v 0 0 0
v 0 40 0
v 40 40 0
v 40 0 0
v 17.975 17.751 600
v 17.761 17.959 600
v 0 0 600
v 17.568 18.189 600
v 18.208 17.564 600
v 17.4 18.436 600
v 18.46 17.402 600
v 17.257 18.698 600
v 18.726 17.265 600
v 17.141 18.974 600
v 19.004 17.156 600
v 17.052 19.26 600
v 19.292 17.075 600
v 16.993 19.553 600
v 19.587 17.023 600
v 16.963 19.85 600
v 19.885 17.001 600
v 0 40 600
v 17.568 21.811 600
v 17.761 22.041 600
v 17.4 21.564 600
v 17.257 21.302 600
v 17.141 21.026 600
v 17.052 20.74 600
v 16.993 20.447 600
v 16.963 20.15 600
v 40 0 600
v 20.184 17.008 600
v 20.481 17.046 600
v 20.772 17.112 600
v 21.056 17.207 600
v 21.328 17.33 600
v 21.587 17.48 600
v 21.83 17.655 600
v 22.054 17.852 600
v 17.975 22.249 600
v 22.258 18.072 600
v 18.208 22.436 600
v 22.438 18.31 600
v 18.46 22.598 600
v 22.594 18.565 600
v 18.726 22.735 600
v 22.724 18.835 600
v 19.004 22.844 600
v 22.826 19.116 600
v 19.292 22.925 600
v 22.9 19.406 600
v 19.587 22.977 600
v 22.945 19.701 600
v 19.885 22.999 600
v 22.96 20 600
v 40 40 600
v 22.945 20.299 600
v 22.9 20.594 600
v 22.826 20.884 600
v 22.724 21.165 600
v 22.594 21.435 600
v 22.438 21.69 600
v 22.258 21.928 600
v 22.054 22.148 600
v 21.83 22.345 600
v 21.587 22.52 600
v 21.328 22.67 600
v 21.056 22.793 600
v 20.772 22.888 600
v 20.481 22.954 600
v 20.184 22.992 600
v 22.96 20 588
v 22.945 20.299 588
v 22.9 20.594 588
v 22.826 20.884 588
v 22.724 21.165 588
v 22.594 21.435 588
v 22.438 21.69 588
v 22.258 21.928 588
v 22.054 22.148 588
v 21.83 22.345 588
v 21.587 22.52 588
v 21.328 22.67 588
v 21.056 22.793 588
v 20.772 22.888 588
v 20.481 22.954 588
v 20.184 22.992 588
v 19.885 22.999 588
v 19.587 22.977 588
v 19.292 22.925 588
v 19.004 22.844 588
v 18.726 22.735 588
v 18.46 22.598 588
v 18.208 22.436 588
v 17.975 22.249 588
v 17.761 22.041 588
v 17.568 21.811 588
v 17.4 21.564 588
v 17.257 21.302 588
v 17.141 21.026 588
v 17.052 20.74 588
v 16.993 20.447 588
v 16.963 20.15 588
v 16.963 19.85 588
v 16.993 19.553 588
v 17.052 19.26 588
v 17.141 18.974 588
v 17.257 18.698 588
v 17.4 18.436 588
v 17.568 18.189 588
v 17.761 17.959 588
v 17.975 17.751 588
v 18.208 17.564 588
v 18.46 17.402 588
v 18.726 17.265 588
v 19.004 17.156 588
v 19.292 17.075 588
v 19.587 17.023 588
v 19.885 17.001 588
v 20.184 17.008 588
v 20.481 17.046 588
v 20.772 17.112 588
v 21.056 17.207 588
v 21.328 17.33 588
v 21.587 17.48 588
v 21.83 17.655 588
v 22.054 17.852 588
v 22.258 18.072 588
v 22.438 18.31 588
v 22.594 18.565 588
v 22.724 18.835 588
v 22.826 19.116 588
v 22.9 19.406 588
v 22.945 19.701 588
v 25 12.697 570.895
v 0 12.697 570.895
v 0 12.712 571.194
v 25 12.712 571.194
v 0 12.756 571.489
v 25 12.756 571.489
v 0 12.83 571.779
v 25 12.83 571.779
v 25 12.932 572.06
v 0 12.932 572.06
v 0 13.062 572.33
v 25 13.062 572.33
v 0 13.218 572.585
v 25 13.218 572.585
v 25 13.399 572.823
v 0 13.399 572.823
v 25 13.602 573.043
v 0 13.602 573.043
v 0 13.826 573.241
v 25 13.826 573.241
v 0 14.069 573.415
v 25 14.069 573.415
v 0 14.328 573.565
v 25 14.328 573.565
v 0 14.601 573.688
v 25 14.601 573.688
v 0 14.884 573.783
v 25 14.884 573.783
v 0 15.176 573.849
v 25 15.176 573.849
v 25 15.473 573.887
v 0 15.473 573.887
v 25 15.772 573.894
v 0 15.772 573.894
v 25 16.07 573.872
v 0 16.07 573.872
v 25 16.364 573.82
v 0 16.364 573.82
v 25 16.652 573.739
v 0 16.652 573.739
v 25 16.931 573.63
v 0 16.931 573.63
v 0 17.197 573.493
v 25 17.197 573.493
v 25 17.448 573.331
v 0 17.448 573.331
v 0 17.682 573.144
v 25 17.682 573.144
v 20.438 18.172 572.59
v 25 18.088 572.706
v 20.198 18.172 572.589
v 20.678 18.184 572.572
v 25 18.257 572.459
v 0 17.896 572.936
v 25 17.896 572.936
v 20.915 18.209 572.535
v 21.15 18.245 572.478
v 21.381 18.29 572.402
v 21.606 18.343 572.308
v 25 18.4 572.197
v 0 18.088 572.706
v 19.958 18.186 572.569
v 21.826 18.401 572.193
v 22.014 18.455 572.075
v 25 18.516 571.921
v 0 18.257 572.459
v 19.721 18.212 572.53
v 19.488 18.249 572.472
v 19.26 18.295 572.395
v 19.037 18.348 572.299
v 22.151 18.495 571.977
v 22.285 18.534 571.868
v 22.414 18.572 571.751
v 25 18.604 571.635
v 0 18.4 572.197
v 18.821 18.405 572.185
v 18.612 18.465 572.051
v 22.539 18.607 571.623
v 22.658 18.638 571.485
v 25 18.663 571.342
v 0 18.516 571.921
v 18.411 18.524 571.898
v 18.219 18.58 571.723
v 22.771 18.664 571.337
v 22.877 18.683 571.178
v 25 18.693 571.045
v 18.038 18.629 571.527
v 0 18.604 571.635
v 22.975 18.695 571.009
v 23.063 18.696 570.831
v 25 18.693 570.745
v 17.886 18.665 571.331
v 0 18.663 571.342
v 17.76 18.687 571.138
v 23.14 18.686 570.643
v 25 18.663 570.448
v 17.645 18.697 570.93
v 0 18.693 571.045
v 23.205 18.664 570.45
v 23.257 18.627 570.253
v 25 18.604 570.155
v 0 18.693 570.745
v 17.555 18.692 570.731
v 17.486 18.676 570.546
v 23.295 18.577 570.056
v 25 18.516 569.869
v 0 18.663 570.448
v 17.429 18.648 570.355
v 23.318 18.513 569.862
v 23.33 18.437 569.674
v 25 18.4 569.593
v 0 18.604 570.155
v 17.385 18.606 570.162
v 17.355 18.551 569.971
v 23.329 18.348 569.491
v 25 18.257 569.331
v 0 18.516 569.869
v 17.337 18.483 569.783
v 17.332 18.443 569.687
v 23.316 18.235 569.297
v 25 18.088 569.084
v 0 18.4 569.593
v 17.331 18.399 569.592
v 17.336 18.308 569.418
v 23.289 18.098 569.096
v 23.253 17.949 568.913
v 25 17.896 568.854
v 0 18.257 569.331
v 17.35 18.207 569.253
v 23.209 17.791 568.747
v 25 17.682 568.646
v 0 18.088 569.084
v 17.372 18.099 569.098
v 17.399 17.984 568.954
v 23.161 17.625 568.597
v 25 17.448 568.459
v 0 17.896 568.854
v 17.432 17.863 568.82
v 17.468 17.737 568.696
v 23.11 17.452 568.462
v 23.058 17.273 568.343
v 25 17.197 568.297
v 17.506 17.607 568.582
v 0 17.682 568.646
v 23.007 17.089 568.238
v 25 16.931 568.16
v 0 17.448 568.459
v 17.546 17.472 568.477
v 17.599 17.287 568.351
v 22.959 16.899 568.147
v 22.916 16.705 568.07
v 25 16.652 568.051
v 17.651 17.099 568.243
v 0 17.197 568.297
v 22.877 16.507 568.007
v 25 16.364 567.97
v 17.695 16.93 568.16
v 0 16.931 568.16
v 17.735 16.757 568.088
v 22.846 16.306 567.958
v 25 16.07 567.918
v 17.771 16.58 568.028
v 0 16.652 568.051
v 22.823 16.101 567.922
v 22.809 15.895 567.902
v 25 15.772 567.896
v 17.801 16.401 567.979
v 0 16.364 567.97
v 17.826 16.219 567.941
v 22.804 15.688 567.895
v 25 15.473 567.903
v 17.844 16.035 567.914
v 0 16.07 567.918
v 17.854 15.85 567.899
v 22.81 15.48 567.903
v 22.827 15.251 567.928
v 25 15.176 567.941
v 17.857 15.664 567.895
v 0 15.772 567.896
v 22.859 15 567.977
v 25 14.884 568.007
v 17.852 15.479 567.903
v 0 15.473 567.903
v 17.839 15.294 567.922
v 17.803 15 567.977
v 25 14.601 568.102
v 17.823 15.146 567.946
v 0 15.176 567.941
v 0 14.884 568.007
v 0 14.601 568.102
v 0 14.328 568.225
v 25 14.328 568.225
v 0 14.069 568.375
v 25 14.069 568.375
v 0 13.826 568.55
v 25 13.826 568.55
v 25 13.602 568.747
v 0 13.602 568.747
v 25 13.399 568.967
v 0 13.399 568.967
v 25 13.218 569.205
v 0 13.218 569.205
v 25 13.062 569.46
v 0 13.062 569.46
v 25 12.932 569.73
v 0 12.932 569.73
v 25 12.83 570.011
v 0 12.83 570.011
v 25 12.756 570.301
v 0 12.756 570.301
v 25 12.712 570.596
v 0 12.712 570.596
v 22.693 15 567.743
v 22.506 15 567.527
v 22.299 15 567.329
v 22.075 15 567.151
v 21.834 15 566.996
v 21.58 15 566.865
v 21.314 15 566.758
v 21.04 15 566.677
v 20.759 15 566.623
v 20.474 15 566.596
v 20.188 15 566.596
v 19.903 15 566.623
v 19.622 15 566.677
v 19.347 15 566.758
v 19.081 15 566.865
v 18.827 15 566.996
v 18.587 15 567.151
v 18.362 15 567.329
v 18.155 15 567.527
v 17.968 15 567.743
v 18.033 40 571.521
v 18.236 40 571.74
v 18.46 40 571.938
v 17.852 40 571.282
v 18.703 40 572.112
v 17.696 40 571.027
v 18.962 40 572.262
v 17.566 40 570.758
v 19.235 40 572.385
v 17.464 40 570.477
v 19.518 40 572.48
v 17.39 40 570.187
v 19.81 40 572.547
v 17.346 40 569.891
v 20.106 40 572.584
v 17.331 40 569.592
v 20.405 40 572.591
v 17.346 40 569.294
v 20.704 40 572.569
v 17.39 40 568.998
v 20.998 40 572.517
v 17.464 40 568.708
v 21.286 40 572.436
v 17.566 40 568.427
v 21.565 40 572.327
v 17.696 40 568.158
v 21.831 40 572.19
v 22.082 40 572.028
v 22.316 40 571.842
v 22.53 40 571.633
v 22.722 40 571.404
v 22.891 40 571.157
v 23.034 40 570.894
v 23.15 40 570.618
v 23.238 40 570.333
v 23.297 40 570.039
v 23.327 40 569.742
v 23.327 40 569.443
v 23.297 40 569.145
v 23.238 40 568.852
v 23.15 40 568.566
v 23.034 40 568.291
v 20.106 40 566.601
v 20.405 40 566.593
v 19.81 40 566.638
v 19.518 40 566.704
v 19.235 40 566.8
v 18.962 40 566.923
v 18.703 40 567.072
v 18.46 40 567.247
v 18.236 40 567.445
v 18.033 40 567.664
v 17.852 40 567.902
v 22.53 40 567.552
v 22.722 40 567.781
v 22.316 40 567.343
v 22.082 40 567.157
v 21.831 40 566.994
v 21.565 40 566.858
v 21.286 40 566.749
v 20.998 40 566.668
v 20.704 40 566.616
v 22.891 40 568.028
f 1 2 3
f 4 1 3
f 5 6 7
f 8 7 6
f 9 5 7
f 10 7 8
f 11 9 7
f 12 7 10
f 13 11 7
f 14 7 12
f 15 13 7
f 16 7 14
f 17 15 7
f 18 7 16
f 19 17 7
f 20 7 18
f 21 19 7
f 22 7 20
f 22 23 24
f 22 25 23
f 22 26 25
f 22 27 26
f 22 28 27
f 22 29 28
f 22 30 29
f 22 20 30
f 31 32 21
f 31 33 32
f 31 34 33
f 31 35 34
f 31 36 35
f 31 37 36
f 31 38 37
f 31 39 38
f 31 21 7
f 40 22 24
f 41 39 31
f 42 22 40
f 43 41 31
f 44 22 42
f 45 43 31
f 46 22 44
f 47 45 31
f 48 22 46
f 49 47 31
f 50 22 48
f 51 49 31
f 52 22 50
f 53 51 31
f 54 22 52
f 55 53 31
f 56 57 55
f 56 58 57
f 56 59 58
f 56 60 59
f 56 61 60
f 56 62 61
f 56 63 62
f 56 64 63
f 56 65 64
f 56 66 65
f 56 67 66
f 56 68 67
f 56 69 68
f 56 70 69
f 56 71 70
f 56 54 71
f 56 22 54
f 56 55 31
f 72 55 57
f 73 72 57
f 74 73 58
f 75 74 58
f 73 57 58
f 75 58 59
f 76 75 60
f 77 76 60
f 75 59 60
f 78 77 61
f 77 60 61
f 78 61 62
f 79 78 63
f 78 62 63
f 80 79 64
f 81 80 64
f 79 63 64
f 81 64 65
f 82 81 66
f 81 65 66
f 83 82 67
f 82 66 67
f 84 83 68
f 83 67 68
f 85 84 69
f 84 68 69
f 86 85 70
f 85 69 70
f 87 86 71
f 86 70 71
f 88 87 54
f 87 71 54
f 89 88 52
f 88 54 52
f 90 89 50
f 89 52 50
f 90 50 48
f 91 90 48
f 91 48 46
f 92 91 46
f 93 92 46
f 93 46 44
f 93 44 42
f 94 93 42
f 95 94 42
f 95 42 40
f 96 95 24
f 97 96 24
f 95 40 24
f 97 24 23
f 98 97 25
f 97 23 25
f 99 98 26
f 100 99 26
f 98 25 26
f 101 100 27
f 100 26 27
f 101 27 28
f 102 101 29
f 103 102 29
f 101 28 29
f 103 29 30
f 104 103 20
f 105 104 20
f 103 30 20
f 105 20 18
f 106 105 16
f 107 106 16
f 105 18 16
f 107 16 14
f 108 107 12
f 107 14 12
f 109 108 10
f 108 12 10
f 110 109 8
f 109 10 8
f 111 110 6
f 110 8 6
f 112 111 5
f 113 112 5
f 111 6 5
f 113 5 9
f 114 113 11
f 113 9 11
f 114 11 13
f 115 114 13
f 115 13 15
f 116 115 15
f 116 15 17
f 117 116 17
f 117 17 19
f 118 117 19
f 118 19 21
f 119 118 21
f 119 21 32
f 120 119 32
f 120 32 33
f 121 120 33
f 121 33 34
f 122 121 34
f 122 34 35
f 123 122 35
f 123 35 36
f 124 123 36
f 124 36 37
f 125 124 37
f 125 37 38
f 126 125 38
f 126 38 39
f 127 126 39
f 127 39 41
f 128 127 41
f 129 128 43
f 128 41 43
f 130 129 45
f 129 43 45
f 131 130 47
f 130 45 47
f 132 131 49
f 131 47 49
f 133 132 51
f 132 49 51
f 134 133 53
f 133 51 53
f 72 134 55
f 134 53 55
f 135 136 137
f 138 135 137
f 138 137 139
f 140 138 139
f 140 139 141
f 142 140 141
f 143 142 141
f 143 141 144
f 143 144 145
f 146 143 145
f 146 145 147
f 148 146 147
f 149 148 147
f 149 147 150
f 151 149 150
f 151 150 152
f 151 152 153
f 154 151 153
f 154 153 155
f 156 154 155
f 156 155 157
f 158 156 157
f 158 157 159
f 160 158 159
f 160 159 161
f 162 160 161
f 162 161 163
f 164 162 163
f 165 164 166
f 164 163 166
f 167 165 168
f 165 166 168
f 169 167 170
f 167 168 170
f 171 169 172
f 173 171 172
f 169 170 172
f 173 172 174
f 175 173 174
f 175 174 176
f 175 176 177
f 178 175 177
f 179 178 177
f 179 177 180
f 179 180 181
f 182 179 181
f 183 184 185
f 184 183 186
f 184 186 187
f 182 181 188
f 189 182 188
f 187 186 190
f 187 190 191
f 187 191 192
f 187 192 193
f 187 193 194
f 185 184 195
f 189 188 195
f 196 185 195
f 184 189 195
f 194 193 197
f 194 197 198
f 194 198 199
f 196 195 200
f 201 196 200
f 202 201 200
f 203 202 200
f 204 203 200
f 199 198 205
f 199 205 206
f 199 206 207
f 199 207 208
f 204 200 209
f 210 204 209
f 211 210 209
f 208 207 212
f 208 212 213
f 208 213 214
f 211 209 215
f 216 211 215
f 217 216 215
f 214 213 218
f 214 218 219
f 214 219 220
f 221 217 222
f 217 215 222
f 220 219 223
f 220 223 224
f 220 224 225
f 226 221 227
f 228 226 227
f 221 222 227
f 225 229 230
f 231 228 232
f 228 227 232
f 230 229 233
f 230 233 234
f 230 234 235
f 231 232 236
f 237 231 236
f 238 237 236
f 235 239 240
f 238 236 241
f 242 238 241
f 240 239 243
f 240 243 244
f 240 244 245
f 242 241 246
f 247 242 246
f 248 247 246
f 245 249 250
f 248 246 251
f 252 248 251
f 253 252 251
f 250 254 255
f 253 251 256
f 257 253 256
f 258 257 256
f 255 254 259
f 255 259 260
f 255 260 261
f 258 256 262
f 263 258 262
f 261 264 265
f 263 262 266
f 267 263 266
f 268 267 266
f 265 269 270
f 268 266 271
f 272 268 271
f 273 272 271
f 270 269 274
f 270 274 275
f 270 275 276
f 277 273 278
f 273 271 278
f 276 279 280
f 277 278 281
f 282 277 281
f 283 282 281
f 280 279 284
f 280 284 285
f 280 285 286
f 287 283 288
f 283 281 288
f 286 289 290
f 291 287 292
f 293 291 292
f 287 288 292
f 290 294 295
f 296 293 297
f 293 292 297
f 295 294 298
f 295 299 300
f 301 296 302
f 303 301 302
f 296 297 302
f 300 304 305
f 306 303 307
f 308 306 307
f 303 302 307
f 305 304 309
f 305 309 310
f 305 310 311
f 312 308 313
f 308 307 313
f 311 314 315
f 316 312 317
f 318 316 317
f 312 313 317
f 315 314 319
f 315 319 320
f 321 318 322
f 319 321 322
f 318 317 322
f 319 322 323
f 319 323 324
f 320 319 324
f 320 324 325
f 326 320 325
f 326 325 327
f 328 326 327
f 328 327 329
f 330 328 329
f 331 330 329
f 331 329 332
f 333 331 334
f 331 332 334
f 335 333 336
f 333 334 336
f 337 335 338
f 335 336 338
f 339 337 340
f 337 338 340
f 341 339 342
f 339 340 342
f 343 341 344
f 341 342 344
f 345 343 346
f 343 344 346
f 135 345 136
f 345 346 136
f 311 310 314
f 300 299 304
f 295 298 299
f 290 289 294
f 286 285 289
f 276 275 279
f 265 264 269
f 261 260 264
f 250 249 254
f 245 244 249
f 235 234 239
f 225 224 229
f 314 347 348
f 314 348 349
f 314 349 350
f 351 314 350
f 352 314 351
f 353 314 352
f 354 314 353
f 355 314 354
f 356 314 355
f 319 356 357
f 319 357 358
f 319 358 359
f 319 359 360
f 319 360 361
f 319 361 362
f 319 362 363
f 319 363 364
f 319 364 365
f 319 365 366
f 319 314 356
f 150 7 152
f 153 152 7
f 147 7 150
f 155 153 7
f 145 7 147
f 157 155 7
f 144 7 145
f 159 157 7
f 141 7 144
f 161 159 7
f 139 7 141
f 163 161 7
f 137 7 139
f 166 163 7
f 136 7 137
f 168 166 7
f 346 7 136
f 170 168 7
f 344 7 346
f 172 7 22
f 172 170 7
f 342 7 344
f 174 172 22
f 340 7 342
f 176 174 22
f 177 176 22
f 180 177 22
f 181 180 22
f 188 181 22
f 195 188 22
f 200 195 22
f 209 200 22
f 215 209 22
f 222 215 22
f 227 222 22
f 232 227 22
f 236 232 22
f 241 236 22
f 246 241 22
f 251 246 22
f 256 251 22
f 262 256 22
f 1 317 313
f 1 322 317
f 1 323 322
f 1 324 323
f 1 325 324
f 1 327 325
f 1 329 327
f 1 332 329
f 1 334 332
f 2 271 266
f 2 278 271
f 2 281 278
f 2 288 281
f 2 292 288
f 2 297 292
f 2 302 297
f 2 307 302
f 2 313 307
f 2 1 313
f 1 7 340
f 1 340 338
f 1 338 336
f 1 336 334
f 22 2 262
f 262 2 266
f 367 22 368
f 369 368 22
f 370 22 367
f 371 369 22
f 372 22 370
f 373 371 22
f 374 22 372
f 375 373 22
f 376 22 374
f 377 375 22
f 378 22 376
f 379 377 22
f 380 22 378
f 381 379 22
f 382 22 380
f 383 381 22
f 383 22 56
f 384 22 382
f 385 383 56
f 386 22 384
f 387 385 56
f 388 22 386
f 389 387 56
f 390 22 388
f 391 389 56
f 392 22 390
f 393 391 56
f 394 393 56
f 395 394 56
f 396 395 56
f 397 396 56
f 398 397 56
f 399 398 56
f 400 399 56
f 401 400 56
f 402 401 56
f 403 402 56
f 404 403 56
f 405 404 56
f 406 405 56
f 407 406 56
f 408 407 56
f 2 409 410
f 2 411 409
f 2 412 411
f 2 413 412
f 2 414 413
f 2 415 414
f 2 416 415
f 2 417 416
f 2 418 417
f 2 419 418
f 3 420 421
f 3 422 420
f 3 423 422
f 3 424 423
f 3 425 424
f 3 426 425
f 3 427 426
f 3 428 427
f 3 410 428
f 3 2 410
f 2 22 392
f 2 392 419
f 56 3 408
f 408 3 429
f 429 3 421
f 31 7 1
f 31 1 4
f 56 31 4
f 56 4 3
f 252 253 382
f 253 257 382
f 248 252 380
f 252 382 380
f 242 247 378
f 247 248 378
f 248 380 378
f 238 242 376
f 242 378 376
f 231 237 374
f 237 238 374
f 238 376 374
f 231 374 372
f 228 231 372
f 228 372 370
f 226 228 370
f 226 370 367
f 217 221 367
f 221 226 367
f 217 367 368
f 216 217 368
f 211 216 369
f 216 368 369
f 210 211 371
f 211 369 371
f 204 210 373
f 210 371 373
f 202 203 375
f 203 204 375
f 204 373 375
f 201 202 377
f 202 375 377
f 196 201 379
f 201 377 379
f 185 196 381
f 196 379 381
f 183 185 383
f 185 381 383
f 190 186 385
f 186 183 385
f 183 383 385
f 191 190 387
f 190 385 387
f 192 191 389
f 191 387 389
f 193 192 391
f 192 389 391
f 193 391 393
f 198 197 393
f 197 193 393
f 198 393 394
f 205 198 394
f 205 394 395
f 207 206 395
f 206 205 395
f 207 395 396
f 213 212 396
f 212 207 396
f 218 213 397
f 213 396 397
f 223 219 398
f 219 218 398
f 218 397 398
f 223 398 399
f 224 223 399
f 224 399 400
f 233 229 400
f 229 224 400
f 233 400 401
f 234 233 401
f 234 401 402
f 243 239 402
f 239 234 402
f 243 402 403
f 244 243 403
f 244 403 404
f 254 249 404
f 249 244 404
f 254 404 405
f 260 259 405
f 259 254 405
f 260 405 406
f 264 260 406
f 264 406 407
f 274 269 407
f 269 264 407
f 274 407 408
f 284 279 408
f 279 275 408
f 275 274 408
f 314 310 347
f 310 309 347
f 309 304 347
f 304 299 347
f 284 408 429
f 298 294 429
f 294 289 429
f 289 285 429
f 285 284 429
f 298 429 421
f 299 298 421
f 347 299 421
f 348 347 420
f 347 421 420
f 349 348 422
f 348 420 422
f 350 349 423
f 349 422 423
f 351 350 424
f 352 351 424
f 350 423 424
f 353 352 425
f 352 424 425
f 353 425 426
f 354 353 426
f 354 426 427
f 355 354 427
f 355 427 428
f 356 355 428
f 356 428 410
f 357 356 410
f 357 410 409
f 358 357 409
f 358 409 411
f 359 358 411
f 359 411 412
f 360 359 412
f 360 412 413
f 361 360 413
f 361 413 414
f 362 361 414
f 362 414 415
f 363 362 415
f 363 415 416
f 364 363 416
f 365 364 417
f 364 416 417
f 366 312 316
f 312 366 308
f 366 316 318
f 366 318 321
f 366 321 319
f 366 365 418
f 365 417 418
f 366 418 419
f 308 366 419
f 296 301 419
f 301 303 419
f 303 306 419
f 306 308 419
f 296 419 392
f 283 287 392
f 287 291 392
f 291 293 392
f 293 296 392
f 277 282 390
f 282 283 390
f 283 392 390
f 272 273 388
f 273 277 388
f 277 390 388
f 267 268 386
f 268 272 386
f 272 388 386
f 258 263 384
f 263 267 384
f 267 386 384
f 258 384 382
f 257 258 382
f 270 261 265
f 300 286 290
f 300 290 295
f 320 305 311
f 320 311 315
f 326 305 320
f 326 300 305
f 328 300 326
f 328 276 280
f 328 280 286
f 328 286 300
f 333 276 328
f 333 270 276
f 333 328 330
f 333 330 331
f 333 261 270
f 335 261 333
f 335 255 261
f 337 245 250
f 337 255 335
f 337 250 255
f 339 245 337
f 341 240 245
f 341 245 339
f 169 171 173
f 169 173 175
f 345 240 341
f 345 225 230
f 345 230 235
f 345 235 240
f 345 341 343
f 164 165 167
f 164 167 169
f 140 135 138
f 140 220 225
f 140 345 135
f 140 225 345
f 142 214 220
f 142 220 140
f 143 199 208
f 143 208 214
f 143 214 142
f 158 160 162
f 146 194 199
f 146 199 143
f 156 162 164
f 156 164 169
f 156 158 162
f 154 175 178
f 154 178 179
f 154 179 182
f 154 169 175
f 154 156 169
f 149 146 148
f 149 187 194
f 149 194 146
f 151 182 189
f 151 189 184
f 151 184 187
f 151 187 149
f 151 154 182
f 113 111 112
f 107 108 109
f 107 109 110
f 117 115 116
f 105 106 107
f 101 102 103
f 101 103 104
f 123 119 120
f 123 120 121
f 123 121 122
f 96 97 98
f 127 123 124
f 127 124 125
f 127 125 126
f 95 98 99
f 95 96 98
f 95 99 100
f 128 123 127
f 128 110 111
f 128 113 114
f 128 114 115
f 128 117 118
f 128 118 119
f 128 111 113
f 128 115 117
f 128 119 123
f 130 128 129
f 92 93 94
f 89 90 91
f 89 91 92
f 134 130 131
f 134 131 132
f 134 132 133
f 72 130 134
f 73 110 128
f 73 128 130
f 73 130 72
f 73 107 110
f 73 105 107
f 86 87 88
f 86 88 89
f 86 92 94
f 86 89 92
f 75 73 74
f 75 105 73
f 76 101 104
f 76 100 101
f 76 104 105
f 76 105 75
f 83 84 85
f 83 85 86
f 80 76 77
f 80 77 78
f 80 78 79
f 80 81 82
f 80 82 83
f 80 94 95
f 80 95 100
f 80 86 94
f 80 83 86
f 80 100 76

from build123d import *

# Parameters (mm, degrees)
F0_W     = 40
F0_H     = 40
F1_DEPTH = 600
F2_R     = 3
F3_DEPTH = 12
F4_R     = 3
F5_DEPTH = 25
F6_R     = 3
F7_DEPTH = 25


with BuildPart() as f1:
    # F0 (on Top) → F1 (new body)
    with BuildSketch(Plane.XY):
        with Locations((20, 20)):
            Rectangle(F0_W, F0_H)
    extrude(amount=F1_DEPTH)

    # F2 (on face) → F3 (cut)
    with BuildSketch(Plane.XY.offset(600)):
        with Locations((19.959681, 20)):
            Circle(F2_R)
    extrude(amount=-F3_DEPTH, mode=Mode.SUBTRACT)

    # F4 (on face) → F5 (cut)
    with BuildSketch(Plane(origin=(0, 0, 0), x_dir=(0, -1, 0), z_dir=(-1, 0, 0))):
        with Locations((-15.696732, 570.895016)):
            Circle(F4_R)
    extrude(amount=-F5_DEPTH, mode=Mode.SUBTRACT)

    # F6 (on face) → F7 (cut)
    with BuildSketch(Plane(origin=(0, 40, 0), x_dir=(-1, 0, 0), z_dir=(0, 1, 0))):
        with Locations((-20.330655, 569.592354)):
            Circle(F6_R)
    extrude(amount=-F7_DEPTH, mode=Mode.SUBTRACT)


solid = f1.part
